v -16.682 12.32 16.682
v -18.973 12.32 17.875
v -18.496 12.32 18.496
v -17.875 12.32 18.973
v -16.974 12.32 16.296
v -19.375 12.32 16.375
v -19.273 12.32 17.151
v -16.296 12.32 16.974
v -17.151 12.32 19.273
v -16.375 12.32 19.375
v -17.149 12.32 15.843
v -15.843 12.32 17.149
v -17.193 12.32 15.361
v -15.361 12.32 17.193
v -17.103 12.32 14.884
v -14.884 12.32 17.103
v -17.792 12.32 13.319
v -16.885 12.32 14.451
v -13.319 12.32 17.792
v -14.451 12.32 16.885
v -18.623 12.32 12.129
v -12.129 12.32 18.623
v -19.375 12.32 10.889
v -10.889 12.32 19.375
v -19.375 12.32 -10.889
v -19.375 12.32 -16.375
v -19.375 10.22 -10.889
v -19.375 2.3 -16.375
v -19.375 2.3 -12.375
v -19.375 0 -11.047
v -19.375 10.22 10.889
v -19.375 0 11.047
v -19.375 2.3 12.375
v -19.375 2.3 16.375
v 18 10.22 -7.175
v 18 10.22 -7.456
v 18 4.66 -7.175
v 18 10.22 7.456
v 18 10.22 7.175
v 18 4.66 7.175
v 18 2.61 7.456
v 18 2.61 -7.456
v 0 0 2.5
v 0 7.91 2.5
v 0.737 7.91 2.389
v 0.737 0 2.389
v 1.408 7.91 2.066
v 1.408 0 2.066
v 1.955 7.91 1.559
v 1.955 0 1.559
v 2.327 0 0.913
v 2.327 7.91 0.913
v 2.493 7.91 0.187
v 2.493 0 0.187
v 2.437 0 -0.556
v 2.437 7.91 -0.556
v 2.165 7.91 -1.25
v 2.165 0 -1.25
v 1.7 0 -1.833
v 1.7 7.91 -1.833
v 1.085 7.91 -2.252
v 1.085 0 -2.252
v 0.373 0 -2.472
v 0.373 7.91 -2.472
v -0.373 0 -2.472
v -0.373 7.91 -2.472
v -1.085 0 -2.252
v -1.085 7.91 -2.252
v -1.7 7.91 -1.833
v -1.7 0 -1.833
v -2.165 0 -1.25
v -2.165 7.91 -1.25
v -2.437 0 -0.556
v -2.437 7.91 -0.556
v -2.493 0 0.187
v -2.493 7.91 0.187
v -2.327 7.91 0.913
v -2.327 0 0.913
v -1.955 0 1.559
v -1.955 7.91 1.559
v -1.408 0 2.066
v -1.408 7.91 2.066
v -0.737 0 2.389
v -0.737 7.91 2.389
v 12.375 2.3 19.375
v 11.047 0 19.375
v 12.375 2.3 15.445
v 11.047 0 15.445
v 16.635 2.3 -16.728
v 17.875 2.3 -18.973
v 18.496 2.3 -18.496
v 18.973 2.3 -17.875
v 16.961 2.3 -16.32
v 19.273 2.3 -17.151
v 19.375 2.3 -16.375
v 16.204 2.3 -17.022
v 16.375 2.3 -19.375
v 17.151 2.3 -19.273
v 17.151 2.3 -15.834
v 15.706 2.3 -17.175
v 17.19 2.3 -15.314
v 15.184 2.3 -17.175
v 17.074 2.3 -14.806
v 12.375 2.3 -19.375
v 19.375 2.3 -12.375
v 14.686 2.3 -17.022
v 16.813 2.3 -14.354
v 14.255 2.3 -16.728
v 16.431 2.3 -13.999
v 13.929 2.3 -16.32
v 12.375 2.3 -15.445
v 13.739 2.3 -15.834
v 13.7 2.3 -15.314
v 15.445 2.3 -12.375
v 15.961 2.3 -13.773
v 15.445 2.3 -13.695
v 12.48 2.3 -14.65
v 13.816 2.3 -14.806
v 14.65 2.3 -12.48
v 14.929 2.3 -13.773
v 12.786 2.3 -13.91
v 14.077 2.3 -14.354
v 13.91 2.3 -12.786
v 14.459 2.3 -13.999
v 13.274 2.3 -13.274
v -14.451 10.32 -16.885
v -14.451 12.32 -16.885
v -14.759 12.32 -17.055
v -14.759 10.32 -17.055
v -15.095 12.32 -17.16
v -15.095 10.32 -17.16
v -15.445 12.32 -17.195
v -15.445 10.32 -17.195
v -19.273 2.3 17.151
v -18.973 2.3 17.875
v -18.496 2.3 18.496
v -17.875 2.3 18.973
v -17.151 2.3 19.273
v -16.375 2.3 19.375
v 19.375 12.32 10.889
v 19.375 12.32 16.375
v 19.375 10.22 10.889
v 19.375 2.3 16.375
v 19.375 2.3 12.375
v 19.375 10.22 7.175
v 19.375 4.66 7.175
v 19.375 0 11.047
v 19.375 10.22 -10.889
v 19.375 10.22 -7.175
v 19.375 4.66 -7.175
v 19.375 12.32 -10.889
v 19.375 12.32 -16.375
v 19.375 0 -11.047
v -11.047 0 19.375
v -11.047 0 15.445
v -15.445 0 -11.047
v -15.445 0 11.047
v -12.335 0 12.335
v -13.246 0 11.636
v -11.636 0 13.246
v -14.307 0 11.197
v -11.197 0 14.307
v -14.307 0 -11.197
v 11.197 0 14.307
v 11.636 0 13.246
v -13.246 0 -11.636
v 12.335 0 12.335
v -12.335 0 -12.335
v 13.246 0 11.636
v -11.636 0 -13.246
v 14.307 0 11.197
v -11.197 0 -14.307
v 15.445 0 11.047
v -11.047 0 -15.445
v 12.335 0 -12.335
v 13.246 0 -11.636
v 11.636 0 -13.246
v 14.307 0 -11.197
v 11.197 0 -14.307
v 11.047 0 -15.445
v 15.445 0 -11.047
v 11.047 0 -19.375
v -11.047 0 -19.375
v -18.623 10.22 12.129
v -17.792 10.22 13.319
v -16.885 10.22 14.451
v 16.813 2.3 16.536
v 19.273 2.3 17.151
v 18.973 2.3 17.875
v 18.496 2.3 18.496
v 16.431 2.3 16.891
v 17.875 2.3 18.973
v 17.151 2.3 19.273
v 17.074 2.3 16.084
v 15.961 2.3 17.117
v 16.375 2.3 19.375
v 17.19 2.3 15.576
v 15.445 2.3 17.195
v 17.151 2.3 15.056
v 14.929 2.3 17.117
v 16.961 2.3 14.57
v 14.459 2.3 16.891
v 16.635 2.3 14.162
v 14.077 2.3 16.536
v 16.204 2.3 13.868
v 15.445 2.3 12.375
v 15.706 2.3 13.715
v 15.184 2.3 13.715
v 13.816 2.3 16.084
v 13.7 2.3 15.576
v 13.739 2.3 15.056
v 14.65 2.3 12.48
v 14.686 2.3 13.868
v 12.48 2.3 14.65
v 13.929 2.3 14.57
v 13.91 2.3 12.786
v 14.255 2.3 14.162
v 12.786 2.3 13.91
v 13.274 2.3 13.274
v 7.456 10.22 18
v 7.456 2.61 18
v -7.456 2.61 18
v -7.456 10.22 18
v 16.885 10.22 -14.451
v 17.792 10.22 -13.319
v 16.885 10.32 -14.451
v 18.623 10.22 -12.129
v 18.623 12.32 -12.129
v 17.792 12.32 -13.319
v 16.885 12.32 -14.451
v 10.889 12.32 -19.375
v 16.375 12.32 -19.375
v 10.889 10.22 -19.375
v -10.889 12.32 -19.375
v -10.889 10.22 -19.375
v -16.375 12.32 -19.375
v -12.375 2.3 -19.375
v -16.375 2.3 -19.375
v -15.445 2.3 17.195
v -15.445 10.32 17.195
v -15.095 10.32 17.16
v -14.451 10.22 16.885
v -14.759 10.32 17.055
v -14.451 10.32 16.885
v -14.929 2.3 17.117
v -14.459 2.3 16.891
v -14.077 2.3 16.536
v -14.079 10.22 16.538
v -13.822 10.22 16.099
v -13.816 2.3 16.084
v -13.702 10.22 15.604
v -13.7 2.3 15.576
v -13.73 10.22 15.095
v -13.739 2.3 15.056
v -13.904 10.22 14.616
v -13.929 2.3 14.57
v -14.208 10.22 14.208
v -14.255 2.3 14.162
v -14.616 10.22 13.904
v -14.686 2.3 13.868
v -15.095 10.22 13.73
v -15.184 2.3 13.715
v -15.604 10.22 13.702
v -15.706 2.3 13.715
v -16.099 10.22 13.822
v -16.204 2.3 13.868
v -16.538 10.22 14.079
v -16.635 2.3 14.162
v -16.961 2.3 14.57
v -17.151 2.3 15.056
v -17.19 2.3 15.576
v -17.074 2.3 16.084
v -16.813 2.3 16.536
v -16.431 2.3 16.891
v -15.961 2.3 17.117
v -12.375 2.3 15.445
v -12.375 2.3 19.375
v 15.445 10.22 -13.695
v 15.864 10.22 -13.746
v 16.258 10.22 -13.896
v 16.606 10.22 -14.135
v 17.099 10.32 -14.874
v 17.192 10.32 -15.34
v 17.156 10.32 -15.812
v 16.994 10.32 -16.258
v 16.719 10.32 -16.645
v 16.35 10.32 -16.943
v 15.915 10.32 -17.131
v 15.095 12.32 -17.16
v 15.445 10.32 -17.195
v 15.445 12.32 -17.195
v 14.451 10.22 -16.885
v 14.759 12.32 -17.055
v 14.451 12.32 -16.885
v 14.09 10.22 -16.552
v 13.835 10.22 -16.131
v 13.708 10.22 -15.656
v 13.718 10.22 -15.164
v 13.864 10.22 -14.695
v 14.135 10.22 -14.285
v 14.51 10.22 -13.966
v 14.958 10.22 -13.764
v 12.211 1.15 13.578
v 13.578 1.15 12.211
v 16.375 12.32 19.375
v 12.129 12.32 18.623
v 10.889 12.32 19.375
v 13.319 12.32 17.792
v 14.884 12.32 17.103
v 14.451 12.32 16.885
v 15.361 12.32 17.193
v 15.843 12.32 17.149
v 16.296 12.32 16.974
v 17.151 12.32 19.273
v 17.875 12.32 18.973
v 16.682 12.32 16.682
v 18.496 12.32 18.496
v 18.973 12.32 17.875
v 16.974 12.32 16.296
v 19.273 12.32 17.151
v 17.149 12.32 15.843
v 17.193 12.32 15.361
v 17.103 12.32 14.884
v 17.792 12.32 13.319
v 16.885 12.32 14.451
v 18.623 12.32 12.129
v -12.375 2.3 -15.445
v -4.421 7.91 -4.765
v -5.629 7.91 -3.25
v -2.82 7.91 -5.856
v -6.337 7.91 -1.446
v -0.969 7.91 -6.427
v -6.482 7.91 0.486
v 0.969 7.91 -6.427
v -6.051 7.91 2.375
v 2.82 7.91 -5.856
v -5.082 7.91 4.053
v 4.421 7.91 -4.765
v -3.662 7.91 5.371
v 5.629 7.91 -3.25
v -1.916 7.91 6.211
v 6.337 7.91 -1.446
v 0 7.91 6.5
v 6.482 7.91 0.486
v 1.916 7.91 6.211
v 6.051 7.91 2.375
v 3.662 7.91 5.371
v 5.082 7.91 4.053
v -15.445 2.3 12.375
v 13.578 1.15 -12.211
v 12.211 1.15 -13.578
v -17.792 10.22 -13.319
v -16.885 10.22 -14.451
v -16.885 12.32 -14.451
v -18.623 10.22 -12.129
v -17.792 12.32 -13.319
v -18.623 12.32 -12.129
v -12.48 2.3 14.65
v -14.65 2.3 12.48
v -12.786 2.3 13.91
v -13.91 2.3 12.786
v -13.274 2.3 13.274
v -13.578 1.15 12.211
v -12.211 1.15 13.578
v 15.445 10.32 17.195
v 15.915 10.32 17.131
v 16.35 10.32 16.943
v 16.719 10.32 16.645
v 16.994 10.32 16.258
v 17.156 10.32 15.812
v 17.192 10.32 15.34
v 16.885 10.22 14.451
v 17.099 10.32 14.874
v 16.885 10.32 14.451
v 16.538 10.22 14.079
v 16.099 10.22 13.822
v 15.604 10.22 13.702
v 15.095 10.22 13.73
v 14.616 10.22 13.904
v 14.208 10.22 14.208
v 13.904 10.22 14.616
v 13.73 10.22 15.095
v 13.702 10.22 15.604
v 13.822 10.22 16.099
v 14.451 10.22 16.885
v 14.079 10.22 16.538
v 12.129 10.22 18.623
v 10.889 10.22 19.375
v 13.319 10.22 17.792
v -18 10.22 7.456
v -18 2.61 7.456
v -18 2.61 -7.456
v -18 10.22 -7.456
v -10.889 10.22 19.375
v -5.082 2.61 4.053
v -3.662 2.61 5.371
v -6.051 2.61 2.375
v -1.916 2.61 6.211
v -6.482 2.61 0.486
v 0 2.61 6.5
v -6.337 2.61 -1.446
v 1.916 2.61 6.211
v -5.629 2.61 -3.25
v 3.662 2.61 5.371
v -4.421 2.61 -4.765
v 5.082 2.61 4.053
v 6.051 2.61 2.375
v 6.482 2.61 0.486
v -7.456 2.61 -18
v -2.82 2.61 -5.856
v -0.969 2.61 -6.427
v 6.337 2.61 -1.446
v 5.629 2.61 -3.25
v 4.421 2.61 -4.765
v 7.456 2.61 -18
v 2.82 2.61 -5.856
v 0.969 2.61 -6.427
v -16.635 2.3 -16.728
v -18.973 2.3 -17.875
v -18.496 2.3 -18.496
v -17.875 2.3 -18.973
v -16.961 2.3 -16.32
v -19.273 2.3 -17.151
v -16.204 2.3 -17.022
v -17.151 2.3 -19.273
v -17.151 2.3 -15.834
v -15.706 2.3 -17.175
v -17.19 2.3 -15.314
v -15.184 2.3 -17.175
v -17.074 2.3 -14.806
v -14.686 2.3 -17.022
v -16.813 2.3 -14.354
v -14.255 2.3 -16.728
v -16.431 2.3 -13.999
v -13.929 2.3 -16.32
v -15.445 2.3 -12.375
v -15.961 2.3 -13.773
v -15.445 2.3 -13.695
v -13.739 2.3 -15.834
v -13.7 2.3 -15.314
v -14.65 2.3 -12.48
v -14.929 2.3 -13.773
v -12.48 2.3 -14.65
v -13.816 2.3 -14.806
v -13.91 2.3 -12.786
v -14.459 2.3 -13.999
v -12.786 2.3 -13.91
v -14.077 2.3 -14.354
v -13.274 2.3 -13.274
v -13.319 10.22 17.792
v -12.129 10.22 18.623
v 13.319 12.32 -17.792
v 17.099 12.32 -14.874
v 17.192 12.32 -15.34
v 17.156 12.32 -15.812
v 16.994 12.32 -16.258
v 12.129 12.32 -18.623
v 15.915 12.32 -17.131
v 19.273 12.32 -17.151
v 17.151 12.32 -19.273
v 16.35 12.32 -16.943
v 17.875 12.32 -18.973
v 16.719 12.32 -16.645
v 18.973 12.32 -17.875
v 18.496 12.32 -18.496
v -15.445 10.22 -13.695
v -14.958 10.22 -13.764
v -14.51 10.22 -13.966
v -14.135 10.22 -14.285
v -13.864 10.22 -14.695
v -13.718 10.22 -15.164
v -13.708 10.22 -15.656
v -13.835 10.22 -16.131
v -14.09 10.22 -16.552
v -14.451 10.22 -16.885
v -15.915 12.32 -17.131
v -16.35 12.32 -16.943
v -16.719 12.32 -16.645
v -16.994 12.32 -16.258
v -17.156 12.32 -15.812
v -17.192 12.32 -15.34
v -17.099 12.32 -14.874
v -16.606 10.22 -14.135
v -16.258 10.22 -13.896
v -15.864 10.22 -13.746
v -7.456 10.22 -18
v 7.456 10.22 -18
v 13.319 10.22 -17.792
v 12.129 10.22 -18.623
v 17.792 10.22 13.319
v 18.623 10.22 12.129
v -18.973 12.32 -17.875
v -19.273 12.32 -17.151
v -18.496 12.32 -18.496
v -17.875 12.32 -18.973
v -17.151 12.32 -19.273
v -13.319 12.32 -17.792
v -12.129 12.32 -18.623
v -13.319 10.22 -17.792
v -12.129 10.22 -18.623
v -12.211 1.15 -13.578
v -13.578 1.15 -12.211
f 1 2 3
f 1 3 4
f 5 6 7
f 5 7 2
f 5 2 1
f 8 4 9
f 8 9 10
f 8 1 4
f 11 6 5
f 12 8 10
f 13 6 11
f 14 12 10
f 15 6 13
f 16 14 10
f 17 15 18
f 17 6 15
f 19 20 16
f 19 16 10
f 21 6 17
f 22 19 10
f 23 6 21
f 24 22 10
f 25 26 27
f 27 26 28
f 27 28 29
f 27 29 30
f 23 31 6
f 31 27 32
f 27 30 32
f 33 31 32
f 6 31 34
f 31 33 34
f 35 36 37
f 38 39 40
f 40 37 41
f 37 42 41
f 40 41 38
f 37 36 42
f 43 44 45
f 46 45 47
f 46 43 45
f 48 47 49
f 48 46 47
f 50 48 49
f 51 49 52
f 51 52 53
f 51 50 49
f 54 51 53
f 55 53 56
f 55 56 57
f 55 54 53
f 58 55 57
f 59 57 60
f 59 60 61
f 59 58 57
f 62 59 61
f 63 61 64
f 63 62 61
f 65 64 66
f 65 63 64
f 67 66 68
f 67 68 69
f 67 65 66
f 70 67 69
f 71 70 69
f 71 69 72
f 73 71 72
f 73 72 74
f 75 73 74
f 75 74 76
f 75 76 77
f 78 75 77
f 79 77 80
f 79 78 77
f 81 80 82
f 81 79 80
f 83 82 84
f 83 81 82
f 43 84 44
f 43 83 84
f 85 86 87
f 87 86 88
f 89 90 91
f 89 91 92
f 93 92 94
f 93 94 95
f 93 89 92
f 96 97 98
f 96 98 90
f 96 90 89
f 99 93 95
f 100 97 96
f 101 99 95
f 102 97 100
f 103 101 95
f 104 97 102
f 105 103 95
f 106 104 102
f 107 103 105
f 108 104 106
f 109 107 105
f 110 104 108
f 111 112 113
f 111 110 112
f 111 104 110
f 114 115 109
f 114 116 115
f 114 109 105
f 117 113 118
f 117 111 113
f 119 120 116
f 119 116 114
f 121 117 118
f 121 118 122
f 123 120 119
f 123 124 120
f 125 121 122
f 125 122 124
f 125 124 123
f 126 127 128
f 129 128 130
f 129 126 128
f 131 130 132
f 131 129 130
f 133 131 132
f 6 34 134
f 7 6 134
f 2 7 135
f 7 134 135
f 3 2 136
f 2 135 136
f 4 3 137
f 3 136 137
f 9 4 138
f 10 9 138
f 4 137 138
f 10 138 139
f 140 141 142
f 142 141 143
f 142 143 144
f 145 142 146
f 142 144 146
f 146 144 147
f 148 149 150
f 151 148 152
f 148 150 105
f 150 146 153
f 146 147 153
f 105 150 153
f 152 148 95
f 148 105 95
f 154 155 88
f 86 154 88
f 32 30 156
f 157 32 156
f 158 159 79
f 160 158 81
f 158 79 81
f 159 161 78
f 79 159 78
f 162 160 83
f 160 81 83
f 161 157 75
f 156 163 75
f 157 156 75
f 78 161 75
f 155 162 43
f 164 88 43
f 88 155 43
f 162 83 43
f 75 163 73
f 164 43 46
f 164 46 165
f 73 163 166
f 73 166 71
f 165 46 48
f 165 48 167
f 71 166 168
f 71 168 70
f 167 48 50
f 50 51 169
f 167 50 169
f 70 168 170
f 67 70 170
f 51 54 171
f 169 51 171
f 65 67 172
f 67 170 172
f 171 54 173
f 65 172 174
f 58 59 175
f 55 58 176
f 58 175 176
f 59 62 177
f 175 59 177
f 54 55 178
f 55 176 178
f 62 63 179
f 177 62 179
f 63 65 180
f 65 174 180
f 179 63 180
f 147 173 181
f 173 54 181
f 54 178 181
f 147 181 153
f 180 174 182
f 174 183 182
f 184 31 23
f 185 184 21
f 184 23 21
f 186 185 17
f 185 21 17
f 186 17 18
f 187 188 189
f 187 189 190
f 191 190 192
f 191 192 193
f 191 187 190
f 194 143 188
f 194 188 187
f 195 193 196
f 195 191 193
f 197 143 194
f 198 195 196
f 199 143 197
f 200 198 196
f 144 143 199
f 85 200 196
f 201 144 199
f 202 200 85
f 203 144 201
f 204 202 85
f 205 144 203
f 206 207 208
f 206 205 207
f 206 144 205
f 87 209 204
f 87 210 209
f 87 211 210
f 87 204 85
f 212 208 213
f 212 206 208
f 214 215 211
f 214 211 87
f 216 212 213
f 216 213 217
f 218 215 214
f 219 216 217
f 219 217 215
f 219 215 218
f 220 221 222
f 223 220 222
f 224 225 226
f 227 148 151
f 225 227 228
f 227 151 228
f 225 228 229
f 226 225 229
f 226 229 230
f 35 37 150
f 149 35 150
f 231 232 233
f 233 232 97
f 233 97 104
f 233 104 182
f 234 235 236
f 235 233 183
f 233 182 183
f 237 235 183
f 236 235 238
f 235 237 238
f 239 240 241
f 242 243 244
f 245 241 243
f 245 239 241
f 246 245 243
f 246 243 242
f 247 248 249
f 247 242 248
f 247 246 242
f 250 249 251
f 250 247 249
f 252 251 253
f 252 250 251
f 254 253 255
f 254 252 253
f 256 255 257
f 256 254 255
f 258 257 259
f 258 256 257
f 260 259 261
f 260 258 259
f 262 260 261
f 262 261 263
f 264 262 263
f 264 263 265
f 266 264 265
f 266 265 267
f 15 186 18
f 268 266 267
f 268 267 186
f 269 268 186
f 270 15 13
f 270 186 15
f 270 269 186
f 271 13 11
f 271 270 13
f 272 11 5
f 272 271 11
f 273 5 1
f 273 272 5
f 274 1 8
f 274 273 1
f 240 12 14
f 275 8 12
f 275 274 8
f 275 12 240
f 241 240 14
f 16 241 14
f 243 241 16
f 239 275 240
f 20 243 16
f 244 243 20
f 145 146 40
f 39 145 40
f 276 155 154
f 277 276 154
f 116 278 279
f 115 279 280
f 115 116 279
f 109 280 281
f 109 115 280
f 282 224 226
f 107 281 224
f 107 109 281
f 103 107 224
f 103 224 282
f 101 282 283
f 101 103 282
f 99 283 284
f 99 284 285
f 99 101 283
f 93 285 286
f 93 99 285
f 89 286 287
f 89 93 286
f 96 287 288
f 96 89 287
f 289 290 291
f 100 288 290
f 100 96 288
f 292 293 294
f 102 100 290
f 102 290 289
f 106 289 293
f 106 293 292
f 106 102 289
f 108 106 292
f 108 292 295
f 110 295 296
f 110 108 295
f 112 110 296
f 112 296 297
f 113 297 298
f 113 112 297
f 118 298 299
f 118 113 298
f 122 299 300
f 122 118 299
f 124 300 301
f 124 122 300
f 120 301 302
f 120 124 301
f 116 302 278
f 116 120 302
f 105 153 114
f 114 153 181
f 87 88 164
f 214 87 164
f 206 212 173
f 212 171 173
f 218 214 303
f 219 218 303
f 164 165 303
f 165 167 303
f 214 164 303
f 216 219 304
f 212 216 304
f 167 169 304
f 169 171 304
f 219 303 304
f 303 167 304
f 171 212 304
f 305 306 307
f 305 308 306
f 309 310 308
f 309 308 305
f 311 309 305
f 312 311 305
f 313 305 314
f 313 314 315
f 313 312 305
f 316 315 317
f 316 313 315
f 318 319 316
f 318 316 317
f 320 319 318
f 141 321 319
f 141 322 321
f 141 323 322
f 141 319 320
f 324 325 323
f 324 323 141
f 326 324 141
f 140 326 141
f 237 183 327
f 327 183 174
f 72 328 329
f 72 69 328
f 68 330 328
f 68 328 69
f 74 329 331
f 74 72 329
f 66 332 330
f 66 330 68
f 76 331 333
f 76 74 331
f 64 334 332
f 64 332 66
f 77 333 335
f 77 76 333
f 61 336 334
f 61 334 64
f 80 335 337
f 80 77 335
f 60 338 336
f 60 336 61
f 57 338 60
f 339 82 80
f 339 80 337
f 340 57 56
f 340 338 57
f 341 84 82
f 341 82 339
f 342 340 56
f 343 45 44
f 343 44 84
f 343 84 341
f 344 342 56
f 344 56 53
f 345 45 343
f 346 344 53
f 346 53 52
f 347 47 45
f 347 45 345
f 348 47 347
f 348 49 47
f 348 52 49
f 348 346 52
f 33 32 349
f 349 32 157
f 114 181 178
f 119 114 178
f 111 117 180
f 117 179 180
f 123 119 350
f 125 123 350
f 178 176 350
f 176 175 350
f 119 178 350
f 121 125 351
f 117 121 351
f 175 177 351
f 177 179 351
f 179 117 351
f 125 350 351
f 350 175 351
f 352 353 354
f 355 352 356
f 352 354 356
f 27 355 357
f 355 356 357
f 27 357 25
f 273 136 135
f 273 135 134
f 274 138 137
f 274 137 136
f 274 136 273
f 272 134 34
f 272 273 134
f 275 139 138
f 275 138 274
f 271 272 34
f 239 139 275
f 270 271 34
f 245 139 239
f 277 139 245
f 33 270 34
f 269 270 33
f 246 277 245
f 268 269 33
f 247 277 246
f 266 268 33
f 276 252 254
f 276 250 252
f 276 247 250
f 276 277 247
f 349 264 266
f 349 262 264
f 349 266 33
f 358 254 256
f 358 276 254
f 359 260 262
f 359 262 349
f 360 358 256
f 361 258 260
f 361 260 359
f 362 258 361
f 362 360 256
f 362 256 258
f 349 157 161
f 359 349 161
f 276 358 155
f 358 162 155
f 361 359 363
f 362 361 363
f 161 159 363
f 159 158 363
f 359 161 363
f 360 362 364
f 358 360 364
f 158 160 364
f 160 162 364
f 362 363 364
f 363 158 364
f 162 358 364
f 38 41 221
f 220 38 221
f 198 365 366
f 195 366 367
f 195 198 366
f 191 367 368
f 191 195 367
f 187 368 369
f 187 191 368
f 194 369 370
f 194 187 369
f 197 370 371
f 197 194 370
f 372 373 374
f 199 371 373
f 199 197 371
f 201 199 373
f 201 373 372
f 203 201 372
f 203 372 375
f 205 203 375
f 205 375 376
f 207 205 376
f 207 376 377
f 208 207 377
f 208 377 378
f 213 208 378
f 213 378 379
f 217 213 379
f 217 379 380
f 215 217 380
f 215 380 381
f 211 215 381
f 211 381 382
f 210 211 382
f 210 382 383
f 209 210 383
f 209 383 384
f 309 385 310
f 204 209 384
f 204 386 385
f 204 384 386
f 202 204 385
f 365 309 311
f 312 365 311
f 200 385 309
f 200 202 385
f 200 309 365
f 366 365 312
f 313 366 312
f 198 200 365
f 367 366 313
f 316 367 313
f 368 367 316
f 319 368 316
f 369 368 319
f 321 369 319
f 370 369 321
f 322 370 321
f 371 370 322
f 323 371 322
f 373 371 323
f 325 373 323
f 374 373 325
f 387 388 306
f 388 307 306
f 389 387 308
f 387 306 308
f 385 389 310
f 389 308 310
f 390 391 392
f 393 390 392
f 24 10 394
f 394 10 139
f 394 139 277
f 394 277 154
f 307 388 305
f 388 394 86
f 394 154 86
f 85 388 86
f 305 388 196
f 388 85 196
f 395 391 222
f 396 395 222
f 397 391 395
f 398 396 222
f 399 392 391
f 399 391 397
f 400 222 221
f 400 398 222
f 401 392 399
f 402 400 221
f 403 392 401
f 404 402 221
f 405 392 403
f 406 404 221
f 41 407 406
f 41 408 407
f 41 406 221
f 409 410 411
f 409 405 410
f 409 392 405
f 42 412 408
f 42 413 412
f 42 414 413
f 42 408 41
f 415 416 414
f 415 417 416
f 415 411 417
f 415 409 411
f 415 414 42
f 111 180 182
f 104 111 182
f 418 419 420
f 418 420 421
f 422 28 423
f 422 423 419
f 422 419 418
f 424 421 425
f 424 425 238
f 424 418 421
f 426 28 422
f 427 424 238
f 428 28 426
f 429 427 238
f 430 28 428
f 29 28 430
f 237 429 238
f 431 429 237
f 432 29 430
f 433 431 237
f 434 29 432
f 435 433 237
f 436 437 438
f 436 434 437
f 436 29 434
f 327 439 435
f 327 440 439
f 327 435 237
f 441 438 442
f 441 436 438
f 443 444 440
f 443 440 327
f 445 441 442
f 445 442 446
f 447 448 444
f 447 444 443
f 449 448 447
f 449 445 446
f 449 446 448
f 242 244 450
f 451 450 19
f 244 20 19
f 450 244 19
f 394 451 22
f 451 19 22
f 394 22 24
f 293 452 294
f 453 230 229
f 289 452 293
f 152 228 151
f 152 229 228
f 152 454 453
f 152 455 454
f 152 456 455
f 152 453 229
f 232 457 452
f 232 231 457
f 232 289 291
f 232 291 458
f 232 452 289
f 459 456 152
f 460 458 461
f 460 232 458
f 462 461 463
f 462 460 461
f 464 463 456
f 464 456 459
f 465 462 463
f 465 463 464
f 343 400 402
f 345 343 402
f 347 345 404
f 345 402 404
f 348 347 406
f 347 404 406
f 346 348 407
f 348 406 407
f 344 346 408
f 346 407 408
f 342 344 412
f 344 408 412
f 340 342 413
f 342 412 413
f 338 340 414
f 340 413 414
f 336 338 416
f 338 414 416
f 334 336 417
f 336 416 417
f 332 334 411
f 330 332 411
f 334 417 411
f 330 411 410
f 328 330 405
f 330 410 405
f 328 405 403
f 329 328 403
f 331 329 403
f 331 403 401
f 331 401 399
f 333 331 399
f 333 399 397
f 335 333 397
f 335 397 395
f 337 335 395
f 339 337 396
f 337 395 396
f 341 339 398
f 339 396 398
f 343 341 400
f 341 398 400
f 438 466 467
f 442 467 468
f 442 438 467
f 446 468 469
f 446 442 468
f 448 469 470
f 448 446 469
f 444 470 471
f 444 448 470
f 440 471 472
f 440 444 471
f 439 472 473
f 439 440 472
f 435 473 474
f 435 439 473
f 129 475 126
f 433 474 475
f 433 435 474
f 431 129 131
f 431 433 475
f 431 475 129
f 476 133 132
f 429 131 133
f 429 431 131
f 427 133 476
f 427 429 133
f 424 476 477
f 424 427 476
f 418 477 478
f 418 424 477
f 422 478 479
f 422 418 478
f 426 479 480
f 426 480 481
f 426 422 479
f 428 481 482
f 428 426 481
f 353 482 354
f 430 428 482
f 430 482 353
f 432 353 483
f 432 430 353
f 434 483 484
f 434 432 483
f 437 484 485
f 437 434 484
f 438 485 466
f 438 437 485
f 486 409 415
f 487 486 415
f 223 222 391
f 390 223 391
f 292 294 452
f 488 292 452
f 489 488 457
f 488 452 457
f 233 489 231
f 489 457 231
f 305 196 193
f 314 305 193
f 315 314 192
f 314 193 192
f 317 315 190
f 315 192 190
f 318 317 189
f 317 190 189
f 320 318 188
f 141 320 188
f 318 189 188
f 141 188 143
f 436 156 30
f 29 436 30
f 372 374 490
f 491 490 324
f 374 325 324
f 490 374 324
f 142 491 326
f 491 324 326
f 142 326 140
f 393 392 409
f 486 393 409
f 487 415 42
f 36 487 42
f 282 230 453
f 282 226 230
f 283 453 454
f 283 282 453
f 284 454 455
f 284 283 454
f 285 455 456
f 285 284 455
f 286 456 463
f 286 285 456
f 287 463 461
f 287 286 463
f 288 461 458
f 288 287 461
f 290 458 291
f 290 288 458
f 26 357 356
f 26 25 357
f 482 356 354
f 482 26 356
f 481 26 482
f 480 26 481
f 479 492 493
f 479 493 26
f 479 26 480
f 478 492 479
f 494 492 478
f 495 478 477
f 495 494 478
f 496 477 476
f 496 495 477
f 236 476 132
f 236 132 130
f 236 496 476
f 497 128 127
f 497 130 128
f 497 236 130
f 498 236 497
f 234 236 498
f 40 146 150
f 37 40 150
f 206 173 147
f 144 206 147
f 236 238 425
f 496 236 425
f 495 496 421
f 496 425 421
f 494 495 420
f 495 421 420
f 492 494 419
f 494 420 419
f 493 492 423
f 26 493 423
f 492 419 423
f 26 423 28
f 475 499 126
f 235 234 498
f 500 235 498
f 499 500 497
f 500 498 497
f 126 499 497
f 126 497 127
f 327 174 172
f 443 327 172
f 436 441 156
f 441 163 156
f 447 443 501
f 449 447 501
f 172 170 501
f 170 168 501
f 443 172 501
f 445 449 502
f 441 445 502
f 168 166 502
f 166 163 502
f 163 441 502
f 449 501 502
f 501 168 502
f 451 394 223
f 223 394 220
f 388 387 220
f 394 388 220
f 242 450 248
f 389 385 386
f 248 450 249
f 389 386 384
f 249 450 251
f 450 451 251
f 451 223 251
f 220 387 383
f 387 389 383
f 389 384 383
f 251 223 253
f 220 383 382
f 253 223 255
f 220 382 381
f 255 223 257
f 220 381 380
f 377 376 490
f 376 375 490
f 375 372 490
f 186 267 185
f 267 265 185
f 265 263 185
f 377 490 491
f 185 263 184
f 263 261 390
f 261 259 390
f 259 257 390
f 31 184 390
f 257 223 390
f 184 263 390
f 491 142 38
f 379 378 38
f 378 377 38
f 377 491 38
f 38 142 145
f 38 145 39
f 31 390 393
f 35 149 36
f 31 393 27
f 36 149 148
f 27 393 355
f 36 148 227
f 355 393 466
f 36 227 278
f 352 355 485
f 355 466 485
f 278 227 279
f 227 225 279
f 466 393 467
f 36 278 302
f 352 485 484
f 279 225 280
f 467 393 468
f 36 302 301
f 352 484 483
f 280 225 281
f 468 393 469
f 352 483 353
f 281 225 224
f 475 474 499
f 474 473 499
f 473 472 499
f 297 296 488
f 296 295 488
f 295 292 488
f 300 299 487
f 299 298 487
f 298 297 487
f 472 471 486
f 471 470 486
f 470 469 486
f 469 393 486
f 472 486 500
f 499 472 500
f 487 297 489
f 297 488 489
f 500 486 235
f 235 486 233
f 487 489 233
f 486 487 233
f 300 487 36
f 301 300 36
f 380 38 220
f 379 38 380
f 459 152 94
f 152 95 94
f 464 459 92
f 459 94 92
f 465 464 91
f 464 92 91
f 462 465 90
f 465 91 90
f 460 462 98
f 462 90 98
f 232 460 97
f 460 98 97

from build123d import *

# Parameters (mm, degrees)
SKETCH1_R           = 2.5
SKETCH1_R_2         = 1.75
BOSS_EXTRUDE1_DEPTH = 2.61
SKETCH2_R           = 1.75
BOSS_EXTRUDE2_DEPTH = 7.71
CUT_EXTRUDE1_START  = -2.3
CUT_EXTRUDE1_DEPTH  = 32.579406586
CUT_EXTRUDE1_TAPER  = -30
CIRPATTERN1_COUNT   = 4
CUT_EXTRUDE2_REACH  = 46.536
SKETCH6_W           = 14.35
SKETCH6_H           = 15.668786702
SKETCH7_R           = 1.75
BOSS_EXTRUDE3_DEPTH = 2
SKETCH9_W           = 16.172360651
SKETCH9_H           = 2.1
SKETCH10_R          = 6.5
SKETCH10_R_2        = 2.5
BOSS_EXTRUDE4_DEPTH = 5.3


with BuildPart() as part:
    # Sketch1 → Boss-Extrude1 (new body)
    with BuildSketch(Plane(origin=(0, 0, 0), x_dir=(1, 0, 0), z_dir=(0, 1, 0))):
        with BuildLine():
            Line((-16.375, -19.375), (16.375, -19.375))
            ThreePointArc((16.375, -19.375), (18.496320344, -18.496320344), (19.375, -16.375))
            Line((19.375, -16.375), (19.375, 16.375))
            ThreePointArc((19.375, 16.375), (18.496320344, 18.496320344), (16.375, 19.375))
            Line((16.375, 19.375), (-16.375, 19.375))
            ThreePointArc((-16.375, 19.375), (-18.496320344, 18.496320344), (-19.375, 16.375))
            Line((-19.375, 16.375), (-19.375, -16.375))
            ThreePointArc((-19.375, -16.375), (-18.496320344, -18.496320344), (-16.375, -19.375))
        make_face()
        with Locations(Location((0, 0, 0), (0, 0, 270))):
            Circle(SKETCH1_R, mode=Mode.SUBTRACT)
        with Locations(Location((-15.444979868, 15.444979868, 0), (0, 0, 270))):
            Circle(SKETCH1_R_2, mode=Mode.SUBTRACT)
        with Locations(Location((15.444979868, 15.444979868, 0), (0, 0, 270))):
            Circle(SKETCH1_R_2, mode=Mode.SUBTRACT)
        with Locations(Location((15.444979868, -15.444979868, 0), (0, 0, 270))):
            Circle(SKETCH1_R_2, mode=Mode.SUBTRACT)
        with Locations(Location((-15.444979868, -15.444979868, 0), (0, 0, 270))):
            Circle(SKETCH1_R_2, mode=Mode.SUBTRACT)
    extrude(amount=BOSS_EXTRUDE1_DEPTH)

    # Sketch2 → Boss-Extrude2 (add)
    with BuildSketch(Plane(origin=(0, 2.61, 0), x_dir=(1, 0, 0), z_dir=(0, 1, 0))):
        with BuildLine():
            Line((19.375, -16.375), (19.375, 16.375))
            ThreePointArc((19.375, 16.375), (18.496320344, 18.496320344), (16.375, 19.375))
            Line((16.375, 19.375), (-16.375, 19.375))
            ThreePointArc((-16.375, 19.375), (-18.496320344, 18.496320344), (-19.375, 16.375))
            Line((-19.375, 16.375), (-19.375, -16.375))
            ThreePointArc((-19.375, -16.375), (-18.496320344, -18.496320344), (-16.375, -19.375))
            Line((-16.375, -19.375), (16.375, -19.375))
            ThreePointArc((16.375, -19.375), (18.496320344, -18.496320344), (19.375, -16.375))
        make_face()
        with Locations(Location((-15.444979868, 15.444979868, 0), (0, 0, 270))):
            Circle(SKETCH2_R, mode=Mode.SUBTRACT)
        with Locations(Location((15.444979868, 15.444979868, 0), (0, 0, 270))):
            Circle(SKETCH2_R, mode=Mode.SUBTRACT)
        with Locations(Location((15.444979868, -15.444979868, 0), (0, 0, 270))):
            Circle(SKETCH2_R, mode=Mode.SUBTRACT)
        with Locations(Location((-15.444979868, -15.444979868, 0), (0, 0, 270))):
            Circle(SKETCH2_R, mode=Mode.SUBTRACT)
        Polygon((-7.455844123, 18), (7.455844123, 18), (18, 7.455844123), (18, -7.455844123), (7.455844123, -18), (-7.455844123, -18), (-18, -7.455844123), (-18, 7.455844123), align=None, mode=Mode.SUBTRACT)
    extrude(amount=BOSS_EXTRUDE2_DEPTH)

    # Sketch4 → Cut-Extrude1 (cut, through all)
    with BuildSketch(Plane.XZ.offset(CUT_EXTRUDE1_START)):
        with BuildLine():
            Line((12.375, 19.375), (12.375, 15.444979868))
            ThreePointArc((12.375, 15.444979868), (13.274176285, 13.274176285), (15.444979868, 12.375))
            Line((15.444979868, 12.375), (19.375, 12.375))
            Line((19.375, 12.375), (19.375, 16.375))
            ThreePointArc((19.375, 16.375), (18.496320344, 18.496320344), (16.375, 19.375))
            Line((16.375, 19.375), (12.375, 19.375))
        make_face()
    cut_extrude1 = extrude(amount=CUT_EXTRUDE1_DEPTH, taper=CUT_EXTRUDE1_TAPER, mode=Mode.SUBTRACT)

    # CirPattern1: Cut-Extrude1 ×4 about axis
    cirpattern1_axis = Axis((0, 0, 0), (0, 1, 0))
    for i in range(1, CIRPATTERN1_COUNT):
        add(cut_extrude1.rotate(cirpattern1_axis, i * 360 / CIRPATTERN1_COUNT), mode=Mode.SUBTRACT)

    # Sketch6 → Cut-Extrude2 (cut, up to next)
    with BuildSketch(Plane(origin=(19.375, 0, 0), x_dir=(0, 0, -1), z_dir=(1, 0, 0)), mode=Mode.PRIVATE) as cut_extrude2_sk1:
        with Locations((0, 12.494393351)):
            Rectangle(SKETCH6_W, SKETCH6_H)
    cut_extrude2_tool1 = extrude(cut_extrude2_sk1.sketch, amount=-CUT_EXTRUDE2_REACH, mode=Mode.PRIVATE) & part.part
    add(cut_extrude2_tool1.solids().sort_by_distance((19.375, 12.494393, 0))[0], mode=Mode.SUBTRACT)

    # Sketch7 → Boss-Extrude3 (add)
    with BuildSketch(Plane(origin=(0, 10.32, 0), x_dir=(1, 0, 0), z_dir=(0, 1, 0))):
        with BuildLine():
            Line((19.375, -7.175), (18, -7.175))
            Line((18, -7.175), (18, -7.455844123))
            Line((18, -7.455844123), (7.455844123, -18))
            Line((7.455844123, -18), (-7.455844123, -18))
            Line((-7.455844123, -18), (-18, -7.455844123))
            Line((-18, -7.455844123), (-18, 7.455844123))
            Line((-18, 7.455844123), (-7.455844123, 18))
            Line((-7.455844123, 18), (7.455844123, 18))
            Line((7.455844123, 18), (18, 7.455844123))
            Line((18, 7.455844123), (18, 7.175))
            Line((18, 7.175), (19.375, 7.175))
            Line((19.375, 7.175), (19.375, 16.375))
            ThreePointArc((19.375, 16.375), (18.496320344, 18.496320344), (16.375, 19.375))
            Line((16.375, 19.375), (-16.375, 19.375))
            ThreePointArc((-16.375, 19.375), (-18.496320344, 18.496320344), (-19.375, 16.375))
            Line((-19.375, 16.375), (-19.375, -16.375))
            ThreePointArc((-19.375, -16.375), (-18.496320344, -18.496320344), (-16.375, -19.375))
            Line((-16.375, -19.375), (16.375, -19.375))
            ThreePointArc((16.375, -19.375), (18.496320344, -18.496320344), (19.375, -16.375))
            Line((19.375, -16.375), (19.375, -7.175))
        make_face()
        with Locations(Location((-15.444979868, -15.444979868, 0), (0, 0, 90))):
            Circle(SKETCH7_R, mode=Mode.SUBTRACT)
        with Locations(Location((15.444979868, -15.444979868, 0), (0, 0, 90))):
            Circle(SKETCH7_R, mode=Mode.SUBTRACT)
        with Locations(Location((15.444979868, 15.444979868, 0), (0, 0, 90))):
            Circle(SKETCH7_R, mode=Mode.SUBTRACT)
        with Locations(Location((-15.444979868, 15.444979868, 0), (0, 0, 90))):
            Circle(SKETCH7_R, mode=Mode.SUBTRACT)
    extrude(amount=BOSS_EXTRUDE3_DEPTH)

    # Sketch9 → Cut-Revolve1 (revolve, cut)
    with BuildSketch(Plane(origin=(0, 0, 0), x_dir=(0.7071067811865475, 0, 0.7071067811865477), z_dir=(-0.7071067811865477, 0, 0.7071067811865475))):
        with Locations((14.138819675, 11.27)):
            Rectangle(SKETCH9_W, SKETCH9_H)
    revolve(axis=Axis((0, 0, 0), (0, 1, 0)), mode=Mode.SUBTRACT)

    # Sketch10 → Boss-Extrude4 (add)
    with BuildSketch(Plane(origin=(0, 2.61, 0), x_dir=(1, 0, 0), z_dir=(0, 1, 0))):
        with Locations(Location((0, 0, 0), (0, 0, 270))):
            Circle(SKETCH10_R)
        with Locations(Location((0, 0, 0), (0, 0, 270))):
            Circle(SKETCH10_R_2, mode=Mode.SUBTRACT)
    extrude(amount=BOSS_EXTRUDE4_DEPTH)


solid = part.part
